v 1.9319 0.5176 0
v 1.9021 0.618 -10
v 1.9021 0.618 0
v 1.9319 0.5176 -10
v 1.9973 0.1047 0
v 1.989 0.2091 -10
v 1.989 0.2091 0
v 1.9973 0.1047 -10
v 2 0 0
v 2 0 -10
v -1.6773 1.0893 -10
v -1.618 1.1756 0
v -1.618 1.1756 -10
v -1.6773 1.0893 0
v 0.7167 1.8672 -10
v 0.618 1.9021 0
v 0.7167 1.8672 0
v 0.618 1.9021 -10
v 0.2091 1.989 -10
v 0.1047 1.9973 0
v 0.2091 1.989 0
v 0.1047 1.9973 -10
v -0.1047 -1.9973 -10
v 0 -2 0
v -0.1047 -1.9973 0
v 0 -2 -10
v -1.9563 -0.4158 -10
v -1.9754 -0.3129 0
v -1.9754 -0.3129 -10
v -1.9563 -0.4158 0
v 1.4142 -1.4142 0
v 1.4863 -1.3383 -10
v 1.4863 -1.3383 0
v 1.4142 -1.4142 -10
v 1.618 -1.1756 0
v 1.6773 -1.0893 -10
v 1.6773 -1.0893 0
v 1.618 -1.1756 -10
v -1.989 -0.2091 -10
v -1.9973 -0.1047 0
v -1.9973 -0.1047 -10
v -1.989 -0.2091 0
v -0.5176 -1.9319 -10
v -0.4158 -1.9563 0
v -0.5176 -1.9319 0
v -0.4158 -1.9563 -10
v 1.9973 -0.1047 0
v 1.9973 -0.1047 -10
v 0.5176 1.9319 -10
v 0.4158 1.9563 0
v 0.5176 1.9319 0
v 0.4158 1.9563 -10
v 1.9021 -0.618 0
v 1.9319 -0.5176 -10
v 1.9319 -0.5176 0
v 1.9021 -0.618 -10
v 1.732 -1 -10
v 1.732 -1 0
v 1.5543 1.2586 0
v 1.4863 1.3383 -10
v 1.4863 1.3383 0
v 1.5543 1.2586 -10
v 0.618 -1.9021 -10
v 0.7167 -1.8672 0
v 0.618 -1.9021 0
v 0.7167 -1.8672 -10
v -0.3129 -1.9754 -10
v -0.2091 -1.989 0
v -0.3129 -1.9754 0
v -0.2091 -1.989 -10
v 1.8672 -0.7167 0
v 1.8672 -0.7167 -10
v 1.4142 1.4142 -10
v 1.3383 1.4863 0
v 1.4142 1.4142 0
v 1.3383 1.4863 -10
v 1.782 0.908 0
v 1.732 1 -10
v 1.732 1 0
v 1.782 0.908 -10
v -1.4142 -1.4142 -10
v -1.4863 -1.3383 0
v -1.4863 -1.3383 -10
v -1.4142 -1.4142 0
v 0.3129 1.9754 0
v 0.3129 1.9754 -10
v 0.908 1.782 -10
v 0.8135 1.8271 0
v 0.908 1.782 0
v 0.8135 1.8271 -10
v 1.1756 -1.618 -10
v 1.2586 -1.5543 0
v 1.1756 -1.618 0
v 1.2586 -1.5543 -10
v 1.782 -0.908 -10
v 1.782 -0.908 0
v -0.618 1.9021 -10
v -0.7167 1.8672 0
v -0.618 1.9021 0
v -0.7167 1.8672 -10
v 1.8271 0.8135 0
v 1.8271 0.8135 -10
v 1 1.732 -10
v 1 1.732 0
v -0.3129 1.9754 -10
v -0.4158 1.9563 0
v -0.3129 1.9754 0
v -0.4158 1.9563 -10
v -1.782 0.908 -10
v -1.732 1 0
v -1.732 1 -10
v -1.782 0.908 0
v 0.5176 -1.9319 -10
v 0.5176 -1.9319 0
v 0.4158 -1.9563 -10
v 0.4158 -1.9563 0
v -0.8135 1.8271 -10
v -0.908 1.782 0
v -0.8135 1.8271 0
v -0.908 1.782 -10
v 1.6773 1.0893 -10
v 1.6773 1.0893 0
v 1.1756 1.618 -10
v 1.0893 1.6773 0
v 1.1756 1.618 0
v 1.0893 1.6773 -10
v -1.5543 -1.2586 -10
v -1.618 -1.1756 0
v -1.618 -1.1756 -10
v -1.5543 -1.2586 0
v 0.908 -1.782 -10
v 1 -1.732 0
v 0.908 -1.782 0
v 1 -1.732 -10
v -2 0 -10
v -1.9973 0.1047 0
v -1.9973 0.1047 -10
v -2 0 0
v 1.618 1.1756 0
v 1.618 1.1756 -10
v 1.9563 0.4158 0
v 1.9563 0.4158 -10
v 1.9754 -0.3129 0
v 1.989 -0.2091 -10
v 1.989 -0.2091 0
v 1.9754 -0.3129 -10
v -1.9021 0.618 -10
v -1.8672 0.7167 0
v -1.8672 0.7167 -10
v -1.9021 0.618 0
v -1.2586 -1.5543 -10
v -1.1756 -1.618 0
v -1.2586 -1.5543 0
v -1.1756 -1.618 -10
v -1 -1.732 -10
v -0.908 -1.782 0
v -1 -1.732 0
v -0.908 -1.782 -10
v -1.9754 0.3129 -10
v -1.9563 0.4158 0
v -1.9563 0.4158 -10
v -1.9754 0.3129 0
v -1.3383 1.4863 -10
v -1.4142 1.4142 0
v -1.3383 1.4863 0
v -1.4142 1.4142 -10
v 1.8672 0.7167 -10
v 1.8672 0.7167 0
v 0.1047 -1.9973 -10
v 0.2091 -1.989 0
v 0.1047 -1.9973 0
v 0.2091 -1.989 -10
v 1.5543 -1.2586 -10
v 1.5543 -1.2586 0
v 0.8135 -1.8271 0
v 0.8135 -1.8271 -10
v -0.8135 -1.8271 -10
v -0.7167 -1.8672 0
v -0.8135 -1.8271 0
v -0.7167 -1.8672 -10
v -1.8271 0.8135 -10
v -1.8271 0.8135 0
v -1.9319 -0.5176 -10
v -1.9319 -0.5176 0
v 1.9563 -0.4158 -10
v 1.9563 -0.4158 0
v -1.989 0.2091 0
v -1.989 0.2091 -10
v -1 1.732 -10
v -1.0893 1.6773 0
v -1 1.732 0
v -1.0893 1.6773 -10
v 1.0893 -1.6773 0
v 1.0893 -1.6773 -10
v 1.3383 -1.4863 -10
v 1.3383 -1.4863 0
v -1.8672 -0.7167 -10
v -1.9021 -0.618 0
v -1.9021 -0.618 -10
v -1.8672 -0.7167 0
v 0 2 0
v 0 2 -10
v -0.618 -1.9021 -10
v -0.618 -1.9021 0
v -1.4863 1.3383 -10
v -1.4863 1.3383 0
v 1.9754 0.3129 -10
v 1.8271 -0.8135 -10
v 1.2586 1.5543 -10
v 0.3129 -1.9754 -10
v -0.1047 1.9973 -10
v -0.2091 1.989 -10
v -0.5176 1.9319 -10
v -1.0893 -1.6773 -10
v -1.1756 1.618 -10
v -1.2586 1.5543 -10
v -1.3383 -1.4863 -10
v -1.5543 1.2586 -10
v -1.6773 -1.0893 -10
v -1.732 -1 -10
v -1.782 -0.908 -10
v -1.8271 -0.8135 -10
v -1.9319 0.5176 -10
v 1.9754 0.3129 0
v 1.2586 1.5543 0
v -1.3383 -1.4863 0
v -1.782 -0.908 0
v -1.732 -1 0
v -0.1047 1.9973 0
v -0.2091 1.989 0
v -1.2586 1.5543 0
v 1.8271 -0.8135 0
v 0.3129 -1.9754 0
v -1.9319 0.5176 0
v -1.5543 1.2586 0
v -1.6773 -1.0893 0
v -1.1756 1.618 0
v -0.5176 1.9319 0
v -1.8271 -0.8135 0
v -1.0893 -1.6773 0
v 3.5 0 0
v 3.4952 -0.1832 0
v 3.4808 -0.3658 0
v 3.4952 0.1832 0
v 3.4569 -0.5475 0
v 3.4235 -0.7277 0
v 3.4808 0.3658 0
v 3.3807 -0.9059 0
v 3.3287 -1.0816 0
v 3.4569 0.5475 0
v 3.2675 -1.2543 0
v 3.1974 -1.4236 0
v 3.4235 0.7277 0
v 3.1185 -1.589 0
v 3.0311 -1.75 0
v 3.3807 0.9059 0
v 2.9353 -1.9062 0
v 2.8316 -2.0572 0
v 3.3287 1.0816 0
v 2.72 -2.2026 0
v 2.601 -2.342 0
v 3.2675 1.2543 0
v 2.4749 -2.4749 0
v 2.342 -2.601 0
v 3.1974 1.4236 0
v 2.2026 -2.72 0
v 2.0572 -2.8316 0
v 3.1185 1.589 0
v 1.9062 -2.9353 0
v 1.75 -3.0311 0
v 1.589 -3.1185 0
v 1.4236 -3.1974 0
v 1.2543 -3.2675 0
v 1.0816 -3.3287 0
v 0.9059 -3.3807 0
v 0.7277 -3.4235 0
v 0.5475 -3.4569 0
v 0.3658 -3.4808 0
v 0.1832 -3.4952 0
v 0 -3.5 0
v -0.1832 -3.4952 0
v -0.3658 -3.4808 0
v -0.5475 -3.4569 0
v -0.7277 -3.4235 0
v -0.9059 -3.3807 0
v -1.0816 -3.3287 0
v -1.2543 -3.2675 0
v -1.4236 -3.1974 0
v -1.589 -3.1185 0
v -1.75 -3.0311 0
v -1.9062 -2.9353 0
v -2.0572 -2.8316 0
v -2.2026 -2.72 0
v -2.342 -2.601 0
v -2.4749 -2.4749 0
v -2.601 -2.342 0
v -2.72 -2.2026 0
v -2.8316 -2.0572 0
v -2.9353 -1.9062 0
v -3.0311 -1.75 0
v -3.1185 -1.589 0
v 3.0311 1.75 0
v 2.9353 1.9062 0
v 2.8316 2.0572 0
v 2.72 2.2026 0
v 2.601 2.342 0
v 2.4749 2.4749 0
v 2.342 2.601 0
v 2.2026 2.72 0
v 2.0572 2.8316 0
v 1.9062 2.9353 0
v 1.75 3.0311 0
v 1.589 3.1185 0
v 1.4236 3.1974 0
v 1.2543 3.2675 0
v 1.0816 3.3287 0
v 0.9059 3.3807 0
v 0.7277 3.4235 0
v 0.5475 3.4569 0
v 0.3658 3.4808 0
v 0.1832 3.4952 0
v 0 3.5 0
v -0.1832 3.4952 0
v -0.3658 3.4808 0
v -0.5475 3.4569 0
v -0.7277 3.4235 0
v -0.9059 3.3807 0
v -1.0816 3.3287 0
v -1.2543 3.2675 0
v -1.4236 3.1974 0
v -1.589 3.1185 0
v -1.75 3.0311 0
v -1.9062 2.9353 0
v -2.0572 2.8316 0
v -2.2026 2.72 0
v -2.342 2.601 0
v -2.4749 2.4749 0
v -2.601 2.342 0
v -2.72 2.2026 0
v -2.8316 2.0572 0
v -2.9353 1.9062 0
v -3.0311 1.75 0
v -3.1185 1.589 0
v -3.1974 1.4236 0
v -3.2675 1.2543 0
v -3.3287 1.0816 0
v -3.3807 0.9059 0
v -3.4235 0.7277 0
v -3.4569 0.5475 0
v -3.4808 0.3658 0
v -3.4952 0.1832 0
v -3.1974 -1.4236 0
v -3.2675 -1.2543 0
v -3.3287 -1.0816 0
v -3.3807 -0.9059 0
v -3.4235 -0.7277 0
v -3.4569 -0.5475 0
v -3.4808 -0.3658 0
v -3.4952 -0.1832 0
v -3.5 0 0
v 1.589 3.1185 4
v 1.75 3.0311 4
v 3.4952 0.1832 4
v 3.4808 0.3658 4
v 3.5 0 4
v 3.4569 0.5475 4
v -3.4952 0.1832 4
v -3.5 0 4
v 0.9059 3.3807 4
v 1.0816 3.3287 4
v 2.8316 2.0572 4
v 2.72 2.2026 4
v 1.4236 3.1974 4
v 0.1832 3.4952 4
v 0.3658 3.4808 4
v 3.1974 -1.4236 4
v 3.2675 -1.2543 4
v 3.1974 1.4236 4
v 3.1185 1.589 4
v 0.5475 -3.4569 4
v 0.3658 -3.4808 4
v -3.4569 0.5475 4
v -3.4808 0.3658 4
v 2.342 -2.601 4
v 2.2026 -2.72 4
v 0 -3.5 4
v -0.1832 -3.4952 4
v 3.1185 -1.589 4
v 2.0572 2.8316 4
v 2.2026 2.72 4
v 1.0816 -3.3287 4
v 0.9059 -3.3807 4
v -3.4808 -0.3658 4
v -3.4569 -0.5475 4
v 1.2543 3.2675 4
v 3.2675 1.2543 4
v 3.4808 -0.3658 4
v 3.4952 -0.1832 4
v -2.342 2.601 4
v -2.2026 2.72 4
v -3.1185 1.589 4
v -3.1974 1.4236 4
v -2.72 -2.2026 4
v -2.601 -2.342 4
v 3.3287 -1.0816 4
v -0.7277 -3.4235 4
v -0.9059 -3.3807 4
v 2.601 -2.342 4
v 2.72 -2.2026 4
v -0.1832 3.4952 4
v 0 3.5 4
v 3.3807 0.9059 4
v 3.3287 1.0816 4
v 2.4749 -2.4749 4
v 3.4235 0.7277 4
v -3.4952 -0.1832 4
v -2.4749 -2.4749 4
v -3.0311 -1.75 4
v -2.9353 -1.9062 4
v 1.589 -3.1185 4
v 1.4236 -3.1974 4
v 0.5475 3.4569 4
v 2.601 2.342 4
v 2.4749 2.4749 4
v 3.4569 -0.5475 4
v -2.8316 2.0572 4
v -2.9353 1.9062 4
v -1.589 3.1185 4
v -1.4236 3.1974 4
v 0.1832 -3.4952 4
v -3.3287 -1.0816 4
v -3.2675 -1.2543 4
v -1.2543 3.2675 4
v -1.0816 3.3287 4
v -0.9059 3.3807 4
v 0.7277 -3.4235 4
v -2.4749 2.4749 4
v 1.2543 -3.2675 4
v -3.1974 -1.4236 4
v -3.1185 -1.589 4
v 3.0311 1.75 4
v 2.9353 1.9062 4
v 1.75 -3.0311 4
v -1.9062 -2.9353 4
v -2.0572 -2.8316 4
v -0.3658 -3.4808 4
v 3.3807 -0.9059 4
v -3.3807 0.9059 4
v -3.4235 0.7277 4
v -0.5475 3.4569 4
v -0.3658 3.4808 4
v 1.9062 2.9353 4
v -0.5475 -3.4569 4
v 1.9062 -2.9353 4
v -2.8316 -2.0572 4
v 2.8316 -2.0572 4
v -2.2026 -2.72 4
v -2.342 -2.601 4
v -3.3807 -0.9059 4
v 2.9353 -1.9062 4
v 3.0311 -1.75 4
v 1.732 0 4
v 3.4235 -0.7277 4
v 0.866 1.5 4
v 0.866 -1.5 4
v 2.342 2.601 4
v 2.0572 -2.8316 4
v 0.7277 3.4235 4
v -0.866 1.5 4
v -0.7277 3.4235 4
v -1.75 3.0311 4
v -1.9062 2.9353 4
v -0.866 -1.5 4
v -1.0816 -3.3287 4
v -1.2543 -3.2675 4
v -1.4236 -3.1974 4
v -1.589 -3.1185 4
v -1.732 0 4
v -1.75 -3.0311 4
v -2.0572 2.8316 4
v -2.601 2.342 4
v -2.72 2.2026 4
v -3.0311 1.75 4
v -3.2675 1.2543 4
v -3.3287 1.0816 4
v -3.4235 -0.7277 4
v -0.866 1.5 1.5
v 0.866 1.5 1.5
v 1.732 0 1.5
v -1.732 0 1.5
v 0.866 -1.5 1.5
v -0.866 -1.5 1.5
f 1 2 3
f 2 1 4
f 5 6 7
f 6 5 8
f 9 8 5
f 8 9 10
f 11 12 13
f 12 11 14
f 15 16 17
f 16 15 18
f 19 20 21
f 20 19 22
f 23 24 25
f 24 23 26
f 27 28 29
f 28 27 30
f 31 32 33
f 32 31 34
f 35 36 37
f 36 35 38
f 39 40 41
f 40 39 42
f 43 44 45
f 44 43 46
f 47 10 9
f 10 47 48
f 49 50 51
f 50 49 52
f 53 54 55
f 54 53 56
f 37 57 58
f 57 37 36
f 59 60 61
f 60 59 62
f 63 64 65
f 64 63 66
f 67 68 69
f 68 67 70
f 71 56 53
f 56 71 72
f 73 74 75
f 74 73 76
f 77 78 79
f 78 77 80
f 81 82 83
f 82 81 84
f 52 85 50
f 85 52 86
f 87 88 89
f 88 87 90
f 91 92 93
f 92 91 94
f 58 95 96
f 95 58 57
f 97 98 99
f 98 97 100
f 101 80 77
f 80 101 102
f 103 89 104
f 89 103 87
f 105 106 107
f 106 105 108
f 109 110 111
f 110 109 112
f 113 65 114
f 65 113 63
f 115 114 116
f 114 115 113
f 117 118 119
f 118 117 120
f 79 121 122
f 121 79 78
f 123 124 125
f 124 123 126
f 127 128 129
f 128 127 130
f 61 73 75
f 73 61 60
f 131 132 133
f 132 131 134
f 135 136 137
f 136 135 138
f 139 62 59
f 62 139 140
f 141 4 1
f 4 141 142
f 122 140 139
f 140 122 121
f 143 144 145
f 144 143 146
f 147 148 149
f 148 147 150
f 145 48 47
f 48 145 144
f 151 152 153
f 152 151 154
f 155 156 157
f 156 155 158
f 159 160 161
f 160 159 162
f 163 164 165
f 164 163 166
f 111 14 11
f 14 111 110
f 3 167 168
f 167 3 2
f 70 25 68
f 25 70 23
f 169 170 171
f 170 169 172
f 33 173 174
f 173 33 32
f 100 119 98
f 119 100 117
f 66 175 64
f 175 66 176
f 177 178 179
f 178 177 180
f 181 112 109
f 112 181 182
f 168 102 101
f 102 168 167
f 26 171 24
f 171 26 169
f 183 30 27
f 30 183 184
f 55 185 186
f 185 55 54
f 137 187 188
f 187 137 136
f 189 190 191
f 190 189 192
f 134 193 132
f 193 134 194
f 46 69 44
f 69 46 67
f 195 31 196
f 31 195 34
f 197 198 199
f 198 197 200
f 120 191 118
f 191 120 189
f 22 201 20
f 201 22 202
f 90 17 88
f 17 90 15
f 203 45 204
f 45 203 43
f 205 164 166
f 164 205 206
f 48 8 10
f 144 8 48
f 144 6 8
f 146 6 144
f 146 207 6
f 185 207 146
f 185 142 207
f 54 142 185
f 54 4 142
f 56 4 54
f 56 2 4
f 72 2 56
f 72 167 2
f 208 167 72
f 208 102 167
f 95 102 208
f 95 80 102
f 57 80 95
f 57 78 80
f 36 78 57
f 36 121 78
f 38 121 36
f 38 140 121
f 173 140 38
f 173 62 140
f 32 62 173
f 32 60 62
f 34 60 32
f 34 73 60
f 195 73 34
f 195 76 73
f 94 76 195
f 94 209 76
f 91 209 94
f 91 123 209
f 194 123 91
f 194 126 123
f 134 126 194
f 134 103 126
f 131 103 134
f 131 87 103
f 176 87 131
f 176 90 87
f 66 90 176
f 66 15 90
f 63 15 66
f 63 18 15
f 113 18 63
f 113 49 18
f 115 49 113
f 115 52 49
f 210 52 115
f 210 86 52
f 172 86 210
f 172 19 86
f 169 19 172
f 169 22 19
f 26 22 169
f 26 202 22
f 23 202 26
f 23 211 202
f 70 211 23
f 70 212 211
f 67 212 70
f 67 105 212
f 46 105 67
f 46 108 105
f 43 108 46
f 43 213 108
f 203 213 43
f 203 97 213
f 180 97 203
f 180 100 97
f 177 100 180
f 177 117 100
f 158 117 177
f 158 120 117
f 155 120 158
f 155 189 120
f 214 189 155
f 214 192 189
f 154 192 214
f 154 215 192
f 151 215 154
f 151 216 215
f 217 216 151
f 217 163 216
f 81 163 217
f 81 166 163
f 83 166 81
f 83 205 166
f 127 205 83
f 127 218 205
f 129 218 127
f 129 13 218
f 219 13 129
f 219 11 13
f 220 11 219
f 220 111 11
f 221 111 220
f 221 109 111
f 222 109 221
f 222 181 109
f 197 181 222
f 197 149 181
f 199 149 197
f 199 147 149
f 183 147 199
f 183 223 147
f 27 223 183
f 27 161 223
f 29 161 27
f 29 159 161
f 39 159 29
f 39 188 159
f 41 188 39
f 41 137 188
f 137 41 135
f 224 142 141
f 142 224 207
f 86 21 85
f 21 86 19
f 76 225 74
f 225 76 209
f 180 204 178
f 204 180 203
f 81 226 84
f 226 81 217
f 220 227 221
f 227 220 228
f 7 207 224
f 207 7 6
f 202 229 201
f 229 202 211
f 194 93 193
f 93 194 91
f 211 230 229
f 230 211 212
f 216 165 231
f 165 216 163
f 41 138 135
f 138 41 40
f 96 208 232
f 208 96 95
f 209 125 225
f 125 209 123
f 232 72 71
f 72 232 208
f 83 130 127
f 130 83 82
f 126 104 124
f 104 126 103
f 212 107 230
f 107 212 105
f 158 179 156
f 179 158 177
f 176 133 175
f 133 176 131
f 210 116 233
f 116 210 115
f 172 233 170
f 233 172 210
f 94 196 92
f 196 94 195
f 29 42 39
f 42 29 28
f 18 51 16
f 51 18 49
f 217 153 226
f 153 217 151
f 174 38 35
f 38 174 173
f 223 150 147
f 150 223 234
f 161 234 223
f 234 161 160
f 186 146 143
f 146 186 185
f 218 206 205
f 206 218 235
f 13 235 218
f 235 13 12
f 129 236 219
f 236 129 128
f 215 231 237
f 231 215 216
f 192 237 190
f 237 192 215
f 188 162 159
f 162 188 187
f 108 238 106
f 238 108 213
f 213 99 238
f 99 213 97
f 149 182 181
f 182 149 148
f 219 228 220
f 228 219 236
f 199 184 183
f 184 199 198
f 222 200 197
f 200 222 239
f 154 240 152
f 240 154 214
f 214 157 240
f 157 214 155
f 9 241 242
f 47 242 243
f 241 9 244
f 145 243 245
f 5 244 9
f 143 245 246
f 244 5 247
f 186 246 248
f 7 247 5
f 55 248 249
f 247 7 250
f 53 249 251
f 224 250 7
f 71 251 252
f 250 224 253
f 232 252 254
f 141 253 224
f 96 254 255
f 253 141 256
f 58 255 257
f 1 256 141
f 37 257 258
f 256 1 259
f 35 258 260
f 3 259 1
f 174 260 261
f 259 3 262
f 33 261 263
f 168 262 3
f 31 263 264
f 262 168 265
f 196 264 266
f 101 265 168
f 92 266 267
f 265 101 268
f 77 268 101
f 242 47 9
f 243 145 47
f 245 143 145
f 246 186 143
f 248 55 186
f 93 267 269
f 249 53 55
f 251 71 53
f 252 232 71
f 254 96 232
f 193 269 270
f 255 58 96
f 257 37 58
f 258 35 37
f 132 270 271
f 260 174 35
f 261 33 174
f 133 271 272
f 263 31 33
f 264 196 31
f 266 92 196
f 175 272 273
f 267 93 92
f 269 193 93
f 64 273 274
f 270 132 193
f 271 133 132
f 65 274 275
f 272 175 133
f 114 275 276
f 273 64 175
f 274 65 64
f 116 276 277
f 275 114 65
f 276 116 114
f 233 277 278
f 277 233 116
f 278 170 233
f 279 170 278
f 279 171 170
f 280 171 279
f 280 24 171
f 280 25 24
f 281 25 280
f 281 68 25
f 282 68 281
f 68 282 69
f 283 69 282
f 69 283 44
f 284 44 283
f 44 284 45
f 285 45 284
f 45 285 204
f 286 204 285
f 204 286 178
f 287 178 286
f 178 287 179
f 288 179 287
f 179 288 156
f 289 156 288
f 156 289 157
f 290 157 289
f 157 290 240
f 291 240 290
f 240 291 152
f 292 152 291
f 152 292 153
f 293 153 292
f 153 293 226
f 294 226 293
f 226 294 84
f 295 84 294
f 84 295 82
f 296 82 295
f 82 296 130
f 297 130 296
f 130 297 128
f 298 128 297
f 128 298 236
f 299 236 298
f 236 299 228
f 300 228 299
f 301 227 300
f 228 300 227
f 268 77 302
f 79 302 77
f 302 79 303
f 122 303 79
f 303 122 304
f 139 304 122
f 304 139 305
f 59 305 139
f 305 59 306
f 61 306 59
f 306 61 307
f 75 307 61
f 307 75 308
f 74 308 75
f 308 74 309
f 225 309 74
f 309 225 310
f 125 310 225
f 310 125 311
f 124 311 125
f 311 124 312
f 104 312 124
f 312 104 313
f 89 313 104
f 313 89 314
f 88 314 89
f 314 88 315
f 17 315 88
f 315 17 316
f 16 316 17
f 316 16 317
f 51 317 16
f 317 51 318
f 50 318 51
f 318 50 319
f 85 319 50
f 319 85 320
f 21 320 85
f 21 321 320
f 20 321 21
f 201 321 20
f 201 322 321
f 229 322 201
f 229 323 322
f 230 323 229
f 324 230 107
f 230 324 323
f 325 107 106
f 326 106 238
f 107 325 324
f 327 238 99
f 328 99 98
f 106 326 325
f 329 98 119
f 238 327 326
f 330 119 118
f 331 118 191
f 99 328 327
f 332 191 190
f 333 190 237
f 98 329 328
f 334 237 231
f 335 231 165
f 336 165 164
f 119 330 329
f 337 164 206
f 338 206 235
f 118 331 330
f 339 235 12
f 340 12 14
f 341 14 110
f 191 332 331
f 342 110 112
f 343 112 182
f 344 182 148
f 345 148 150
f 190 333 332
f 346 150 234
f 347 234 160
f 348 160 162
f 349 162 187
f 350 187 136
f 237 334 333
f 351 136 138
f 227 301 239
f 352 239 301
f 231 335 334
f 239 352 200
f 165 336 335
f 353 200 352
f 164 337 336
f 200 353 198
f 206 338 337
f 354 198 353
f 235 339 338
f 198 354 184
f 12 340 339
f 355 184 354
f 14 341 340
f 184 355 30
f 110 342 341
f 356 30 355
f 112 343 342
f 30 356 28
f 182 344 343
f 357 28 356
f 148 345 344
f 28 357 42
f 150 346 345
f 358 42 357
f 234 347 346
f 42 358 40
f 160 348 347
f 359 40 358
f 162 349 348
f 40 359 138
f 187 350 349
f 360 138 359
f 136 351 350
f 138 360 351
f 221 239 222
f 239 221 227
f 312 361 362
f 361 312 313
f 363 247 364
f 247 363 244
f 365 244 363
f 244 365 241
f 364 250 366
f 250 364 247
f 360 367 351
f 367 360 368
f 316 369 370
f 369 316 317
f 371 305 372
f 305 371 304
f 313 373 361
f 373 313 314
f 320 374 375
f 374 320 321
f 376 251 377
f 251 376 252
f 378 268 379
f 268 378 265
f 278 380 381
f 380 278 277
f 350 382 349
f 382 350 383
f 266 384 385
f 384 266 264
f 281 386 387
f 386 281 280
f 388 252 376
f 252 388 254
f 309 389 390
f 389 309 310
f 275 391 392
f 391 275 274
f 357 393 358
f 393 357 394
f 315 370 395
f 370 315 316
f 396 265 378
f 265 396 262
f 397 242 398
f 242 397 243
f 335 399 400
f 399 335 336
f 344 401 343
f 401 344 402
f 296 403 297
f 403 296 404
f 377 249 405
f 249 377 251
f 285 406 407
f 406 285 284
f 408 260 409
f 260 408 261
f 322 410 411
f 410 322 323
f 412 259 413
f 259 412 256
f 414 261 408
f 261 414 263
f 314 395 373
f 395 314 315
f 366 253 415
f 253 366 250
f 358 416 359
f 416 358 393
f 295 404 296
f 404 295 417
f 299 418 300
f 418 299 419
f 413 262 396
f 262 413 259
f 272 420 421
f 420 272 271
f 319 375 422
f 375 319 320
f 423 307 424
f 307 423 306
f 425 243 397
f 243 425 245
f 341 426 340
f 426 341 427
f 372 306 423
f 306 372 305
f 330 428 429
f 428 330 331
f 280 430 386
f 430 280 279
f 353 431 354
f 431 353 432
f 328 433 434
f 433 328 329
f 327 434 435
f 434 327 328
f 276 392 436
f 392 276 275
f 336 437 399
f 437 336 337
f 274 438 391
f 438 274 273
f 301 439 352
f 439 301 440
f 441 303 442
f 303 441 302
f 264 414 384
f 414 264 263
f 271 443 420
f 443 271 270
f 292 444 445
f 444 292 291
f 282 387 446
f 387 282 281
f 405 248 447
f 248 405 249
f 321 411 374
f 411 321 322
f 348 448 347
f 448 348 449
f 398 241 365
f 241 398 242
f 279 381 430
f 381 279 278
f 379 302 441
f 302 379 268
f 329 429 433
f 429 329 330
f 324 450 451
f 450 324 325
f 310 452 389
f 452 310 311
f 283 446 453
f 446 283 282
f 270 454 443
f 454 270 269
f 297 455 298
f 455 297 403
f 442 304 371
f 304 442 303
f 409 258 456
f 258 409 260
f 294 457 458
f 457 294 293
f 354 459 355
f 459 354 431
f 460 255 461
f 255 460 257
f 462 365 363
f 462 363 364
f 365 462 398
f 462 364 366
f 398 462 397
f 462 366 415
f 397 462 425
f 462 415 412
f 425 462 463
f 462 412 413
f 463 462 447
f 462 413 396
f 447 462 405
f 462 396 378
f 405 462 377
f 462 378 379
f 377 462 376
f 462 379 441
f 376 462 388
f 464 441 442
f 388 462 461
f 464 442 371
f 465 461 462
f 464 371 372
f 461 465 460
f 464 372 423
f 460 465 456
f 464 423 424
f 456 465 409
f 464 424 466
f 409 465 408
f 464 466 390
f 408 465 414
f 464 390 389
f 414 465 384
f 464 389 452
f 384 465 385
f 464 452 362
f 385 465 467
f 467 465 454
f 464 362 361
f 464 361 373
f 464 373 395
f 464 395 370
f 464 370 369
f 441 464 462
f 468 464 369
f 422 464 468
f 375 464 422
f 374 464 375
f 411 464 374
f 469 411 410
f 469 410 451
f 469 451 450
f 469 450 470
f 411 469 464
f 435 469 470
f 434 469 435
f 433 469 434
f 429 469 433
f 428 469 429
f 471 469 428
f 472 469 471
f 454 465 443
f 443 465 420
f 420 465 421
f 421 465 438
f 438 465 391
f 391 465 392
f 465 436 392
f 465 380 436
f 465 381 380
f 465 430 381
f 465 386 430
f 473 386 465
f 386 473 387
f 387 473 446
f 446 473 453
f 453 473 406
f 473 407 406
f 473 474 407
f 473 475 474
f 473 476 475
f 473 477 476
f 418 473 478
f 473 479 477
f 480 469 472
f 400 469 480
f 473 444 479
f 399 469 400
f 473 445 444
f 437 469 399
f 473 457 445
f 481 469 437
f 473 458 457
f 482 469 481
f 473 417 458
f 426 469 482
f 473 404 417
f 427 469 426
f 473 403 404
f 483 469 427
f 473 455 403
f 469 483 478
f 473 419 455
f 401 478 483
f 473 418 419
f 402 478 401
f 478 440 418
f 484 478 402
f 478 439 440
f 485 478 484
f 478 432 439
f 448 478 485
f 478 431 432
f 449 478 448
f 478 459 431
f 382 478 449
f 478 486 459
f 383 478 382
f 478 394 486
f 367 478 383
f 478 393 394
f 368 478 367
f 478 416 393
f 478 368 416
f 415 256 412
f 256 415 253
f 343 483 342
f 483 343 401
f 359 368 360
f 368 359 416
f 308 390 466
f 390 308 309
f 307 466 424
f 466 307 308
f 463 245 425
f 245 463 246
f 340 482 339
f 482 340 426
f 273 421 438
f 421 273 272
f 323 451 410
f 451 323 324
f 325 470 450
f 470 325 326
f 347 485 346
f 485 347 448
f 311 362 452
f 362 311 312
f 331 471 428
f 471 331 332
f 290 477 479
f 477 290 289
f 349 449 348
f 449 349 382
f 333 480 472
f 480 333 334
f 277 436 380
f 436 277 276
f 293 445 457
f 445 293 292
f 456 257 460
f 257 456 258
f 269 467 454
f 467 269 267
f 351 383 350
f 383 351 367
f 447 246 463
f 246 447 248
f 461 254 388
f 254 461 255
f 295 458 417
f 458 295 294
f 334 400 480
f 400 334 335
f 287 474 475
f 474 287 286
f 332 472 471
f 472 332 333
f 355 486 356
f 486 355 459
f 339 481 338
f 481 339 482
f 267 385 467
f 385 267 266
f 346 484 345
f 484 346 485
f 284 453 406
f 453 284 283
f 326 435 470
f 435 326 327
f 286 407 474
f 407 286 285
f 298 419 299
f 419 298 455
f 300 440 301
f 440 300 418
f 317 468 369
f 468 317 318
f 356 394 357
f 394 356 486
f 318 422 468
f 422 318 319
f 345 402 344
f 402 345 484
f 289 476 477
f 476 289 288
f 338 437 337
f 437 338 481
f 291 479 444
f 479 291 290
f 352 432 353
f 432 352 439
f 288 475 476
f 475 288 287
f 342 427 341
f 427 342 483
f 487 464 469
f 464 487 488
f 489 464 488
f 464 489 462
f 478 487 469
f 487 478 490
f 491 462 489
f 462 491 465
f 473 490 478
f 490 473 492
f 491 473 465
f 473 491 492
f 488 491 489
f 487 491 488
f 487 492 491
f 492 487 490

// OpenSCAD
// Socket head cap screw (M4 x 10) - connected solid with visible hex socket

$fn = 120;

// Dimensions (mm)
shank_d = 4.0;
shank_L = 10.0;          // under-head length
head_d  = 7.0;
head_H  = 4.0;

// Hex socket (across flats) and depth
socket_af    = 3.0;
socket_depth = 2.5;

// Small edge details
tip_chamfer       = 0.3;
head_top_chamfer  = 0.3;

// Boolean robustness overlap
overlap = 0.2;

// Derived
total_L = shank_L + head_H;

// Helpers
function hex_R_from_AF(af) = af / sqrt(3); // circumradius for regular hex given across-flats

module hex_prism(af, h, center=false) {
    R = hex_R_from_AF(af);
    linear_extrude(height=h, center=center, convexity=10)
        polygon(points=[ for (i=[0:5]) [ R*cos(60*i), R*sin(60*i) ] ]);
}

module screw() {
    difference() {
        union() {
            // Shank: from z=0 (under head) down to z=-shank_L
            translate([0,0,-shank_L/2])
                cylinder(h=shank_L, r=shank_d/2, center=true);

            // Tip chamfer at bottom end (kept within shank length)
            translate([0,0,-shank_L + tip_chamfer/2])
                cylinder(h=tip_chamfer, r1=shank_d/2, r2=max(0.01, shank_d/2 - tip_chamfer), center=true);

            // Head: from z=0 up to z=head_H
            translate([0,0, head_H/2])
                cylinder(h=head_H, r=head_d/2, center=true);

            // Top chamfer on head (kept within head height)
            translate([0,0, head_H - head_top_chamfer/2])
                cylinder(h=head_top_chamfer,
                         r1=head_d/2,
                         r2=max(0.01, head_d/2 - head_top_chamfer),
                         center=true);
        }

        // Hex socket recess from top face downward
        translate([0,0, head_H - socket_depth/2 + overlap/2])
            hex_prism(socket_af, socket_depth + overlap, center=true);
    }
}

screw();
